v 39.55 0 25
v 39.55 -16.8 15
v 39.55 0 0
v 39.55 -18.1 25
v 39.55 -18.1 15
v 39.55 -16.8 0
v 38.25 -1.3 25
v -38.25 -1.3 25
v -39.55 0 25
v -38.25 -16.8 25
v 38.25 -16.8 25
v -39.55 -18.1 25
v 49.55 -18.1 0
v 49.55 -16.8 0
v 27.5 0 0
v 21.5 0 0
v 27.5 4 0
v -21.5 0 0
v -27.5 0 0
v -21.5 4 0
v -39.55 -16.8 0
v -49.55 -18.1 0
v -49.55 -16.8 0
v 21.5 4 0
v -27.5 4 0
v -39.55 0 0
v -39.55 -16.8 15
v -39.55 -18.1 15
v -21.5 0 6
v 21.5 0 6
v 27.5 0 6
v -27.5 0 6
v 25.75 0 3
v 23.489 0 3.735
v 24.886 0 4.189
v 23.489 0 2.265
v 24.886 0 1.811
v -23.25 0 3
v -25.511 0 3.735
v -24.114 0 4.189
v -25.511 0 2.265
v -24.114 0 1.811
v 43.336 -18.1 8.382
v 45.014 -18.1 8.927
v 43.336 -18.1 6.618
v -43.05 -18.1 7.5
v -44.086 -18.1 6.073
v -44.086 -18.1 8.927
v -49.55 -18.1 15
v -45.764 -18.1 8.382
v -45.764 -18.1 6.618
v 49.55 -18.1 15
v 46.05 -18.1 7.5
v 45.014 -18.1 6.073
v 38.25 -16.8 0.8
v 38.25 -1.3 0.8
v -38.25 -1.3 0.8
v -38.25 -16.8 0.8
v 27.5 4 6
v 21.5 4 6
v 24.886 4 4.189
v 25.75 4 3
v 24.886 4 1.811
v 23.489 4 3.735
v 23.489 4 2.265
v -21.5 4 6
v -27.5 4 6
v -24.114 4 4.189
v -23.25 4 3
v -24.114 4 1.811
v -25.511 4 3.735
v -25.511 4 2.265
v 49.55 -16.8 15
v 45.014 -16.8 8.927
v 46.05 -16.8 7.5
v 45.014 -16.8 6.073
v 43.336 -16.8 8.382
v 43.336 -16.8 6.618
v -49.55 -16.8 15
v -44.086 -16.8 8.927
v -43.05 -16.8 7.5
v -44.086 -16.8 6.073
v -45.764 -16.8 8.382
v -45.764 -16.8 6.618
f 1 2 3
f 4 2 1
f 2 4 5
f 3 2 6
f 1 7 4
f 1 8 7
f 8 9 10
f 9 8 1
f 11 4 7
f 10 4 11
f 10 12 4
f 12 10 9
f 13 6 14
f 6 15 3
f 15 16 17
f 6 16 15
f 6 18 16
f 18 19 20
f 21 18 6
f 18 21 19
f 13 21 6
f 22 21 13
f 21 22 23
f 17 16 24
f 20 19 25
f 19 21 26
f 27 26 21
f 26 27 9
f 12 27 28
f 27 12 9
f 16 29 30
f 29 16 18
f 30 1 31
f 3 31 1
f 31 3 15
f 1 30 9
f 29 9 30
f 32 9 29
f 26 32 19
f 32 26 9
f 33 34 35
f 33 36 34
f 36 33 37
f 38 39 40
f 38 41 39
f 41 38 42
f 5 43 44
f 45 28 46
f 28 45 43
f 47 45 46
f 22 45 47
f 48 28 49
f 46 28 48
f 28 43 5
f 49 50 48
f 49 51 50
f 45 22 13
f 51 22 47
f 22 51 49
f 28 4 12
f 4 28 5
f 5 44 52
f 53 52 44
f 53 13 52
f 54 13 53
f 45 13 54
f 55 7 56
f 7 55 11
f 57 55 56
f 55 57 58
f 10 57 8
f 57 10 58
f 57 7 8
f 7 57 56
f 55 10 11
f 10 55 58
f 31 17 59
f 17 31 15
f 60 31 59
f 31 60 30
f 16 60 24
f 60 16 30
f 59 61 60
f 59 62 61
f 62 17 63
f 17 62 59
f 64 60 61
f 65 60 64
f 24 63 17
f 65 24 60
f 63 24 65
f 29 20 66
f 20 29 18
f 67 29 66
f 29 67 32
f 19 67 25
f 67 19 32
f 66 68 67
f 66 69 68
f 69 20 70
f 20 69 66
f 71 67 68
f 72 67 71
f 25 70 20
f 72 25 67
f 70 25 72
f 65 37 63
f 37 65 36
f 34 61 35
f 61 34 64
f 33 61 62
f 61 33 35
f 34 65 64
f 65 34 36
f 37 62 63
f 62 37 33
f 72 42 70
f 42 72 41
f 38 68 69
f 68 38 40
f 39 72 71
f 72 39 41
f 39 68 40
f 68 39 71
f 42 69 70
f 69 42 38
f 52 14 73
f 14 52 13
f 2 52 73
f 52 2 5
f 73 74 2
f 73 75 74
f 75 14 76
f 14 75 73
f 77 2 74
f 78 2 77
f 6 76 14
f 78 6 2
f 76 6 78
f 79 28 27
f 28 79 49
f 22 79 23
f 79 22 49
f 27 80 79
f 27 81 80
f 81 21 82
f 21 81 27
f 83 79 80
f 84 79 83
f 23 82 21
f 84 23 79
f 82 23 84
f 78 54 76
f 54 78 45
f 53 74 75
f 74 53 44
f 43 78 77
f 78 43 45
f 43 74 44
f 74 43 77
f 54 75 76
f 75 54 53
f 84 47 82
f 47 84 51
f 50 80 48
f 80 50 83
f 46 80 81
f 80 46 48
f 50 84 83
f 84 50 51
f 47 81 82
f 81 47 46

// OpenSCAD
// Mount for an SSD in a case and a Raspberry Pi for vertical mounting.
// Two parts/one design - re-render/export with bottom_half set to 0 & 1
//
// SSD case sits vertically in the Bottom part
// Top part is the same, but without the bottom.
// Both parts have mounts for a Raspberry Pi
//
// Copyright S.R.Smith 2021
//

bottom_half = 1; 

// Adjust these to match the SSD case size

ssd_width           = 76.5;   // width of SSD case
ssd_thickness       = 15.5;   // thickness of SSD case
mount_width         = 25.0;   // how high do you want each mount
wall_thickness      = 1.3;

// These only need adjusting if the RPi mounts or ears need adjusting

pi_hole_width       = 49.0;
pi_hole_length      = 58.0;

pi_mount_width      = 6.0;
pi_mount_height     = 4.0;
pi_mount_hole_dia   = 2.5;

ear_height          = 15.0;
ear_width           = 10.0;
ear_hole_dia        = 3.0;
ear_hole_head       = 6.0;

pi_mount_hole_depth = pi_mount_height + wall_thickness + 2.0;

// outer dimensions of case block
base_width  = ssd_width     + 2 * wall_thickness;
base_depth  = ssd_thickness + 2 * wall_thickness;
base_height = mount_width;

inner_width     = ssd_width;
inner_depth     = ssd_thickness;
inner_height    = base_height + 2.0;
inner_translate = base_height/2 + bottom_half * wall_thickness;

//-----------------------------------------------------------------------
// Main body to hold SSD case
//-----------------------------------------------------------------------

module body() {
    
  difference() {
    // outer wall
    translate( [0, -base_depth/2, base_height/2]) 
      cube([base_width, base_depth, base_height], true);
    // inner hole for end of SSD case
    translate( [0, -base_depth/2, inner_translate])
      cube([ssd_width, ssd_thickness, base_height + 1.0], true);
  } 
}

//-----------------------------------------------------------------------
// Two mounting ears either side with a screw hole
//-----------------------------------------------------------------------

module ears() {
  difference() {
    union () {
      translate([(base_width + ear_width)/2,
                 -(base_depth - wall_thickness/2), 
                 ear_height/2])
        cube([ear_width, wall_thickness, ear_height], true);
        
      translate([-(base_width + ear_width)/2,
                 -(base_depth - wall_thickness/2), 
                 ear_height/2])
        cube([ear_width, wall_thickness, ear_height], true);
    }
    translate([(base_width + ear_width)/2,
               -(base_depth - wall_thickness/2), 
               ear_height/2])
      rotate([90,0,0])
        cylinder(h=wall_thickness + 2.0, 
                  r=ear_hole_dia/2,
                  center=true);
    translate([-(base_width + ear_width)/2,
               -(base_depth - wall_thickness/2), 
               ear_height/2])
      rotate([90,0,0])
        cylinder(h=wall_thickness + 2.0, 
                  r=ear_hole_dia/2,
                  center=true);
  }
}

//-----------------------------------------------------------------------
// Two stub mounting points with a screw hole
//-----------------------------------------------------------------------

module pi_mounts() {
  difference() {
    union() {
      translate([pi_hole_width /2, pi_mount_height/2, pi_mount_width /2])
        cube([pi_mount_width, pi_mount_height, pi_mount_width], true);
      translate([-pi_hole_width /2, pi_mount_height/2, pi_mount_width /2])
        cube([pi_mount_width, pi_mount_height, pi_mount_width], true);
    };
    translate([pi_hole_width /2, pi_mount_height /2, pi_mount_width /2])
      rotate([90,0,0])
        cylinder(h=pi_mount_hole_depth, 
                 r=pi_mount_hole_dia/2,
                 center=true);
    translate([-pi_hole_width /2, pi_mount_height /2, pi_mount_width /2])
      rotate([90,0,0])
        cylinder(h=pi_mount_hole_depth, 
                 r=pi_mount_hole_dia/2,
                 center=true);
  } 
}

//-----------------------------------------------------------------------
// Put it all together
//-----------------------------------------------------------------------

module mount() {
  body();
  pi_mounts();
  ears();
}

mount();
